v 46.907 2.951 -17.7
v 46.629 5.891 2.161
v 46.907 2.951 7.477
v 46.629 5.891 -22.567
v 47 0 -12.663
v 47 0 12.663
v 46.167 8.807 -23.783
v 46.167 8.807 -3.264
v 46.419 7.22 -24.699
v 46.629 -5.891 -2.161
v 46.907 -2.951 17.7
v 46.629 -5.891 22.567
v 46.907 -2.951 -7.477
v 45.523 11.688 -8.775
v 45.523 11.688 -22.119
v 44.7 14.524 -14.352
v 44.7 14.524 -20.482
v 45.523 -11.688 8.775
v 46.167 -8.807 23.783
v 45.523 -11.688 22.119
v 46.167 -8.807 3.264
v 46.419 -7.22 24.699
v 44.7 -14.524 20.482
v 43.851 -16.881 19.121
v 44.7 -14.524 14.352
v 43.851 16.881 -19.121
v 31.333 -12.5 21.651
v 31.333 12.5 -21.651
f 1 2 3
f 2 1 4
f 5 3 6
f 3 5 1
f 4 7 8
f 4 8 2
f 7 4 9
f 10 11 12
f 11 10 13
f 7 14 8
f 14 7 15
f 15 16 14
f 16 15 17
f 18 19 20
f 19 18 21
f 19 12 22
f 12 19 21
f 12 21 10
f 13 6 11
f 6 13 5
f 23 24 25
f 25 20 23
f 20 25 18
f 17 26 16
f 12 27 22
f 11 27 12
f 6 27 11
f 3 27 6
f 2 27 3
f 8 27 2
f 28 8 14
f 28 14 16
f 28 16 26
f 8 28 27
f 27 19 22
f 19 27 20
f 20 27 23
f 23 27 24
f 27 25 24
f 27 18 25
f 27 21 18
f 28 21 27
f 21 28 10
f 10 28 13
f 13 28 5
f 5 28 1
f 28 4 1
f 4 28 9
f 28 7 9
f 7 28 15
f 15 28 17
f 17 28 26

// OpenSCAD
jar_width = 94;
wall = 4;
tube_height = 100;


intersection(){
#cylinder(h=tube_height, r=jar_width/2, center=true, $fn=100);


translate([jar_width*5/6,0,0])
rotate([30,0,0])
scale([1,0.7,1])
rotate([0,0,-60])
cylinder(h=tube_height/2, r=jar_width/2, center=true, $fn=3);
}
